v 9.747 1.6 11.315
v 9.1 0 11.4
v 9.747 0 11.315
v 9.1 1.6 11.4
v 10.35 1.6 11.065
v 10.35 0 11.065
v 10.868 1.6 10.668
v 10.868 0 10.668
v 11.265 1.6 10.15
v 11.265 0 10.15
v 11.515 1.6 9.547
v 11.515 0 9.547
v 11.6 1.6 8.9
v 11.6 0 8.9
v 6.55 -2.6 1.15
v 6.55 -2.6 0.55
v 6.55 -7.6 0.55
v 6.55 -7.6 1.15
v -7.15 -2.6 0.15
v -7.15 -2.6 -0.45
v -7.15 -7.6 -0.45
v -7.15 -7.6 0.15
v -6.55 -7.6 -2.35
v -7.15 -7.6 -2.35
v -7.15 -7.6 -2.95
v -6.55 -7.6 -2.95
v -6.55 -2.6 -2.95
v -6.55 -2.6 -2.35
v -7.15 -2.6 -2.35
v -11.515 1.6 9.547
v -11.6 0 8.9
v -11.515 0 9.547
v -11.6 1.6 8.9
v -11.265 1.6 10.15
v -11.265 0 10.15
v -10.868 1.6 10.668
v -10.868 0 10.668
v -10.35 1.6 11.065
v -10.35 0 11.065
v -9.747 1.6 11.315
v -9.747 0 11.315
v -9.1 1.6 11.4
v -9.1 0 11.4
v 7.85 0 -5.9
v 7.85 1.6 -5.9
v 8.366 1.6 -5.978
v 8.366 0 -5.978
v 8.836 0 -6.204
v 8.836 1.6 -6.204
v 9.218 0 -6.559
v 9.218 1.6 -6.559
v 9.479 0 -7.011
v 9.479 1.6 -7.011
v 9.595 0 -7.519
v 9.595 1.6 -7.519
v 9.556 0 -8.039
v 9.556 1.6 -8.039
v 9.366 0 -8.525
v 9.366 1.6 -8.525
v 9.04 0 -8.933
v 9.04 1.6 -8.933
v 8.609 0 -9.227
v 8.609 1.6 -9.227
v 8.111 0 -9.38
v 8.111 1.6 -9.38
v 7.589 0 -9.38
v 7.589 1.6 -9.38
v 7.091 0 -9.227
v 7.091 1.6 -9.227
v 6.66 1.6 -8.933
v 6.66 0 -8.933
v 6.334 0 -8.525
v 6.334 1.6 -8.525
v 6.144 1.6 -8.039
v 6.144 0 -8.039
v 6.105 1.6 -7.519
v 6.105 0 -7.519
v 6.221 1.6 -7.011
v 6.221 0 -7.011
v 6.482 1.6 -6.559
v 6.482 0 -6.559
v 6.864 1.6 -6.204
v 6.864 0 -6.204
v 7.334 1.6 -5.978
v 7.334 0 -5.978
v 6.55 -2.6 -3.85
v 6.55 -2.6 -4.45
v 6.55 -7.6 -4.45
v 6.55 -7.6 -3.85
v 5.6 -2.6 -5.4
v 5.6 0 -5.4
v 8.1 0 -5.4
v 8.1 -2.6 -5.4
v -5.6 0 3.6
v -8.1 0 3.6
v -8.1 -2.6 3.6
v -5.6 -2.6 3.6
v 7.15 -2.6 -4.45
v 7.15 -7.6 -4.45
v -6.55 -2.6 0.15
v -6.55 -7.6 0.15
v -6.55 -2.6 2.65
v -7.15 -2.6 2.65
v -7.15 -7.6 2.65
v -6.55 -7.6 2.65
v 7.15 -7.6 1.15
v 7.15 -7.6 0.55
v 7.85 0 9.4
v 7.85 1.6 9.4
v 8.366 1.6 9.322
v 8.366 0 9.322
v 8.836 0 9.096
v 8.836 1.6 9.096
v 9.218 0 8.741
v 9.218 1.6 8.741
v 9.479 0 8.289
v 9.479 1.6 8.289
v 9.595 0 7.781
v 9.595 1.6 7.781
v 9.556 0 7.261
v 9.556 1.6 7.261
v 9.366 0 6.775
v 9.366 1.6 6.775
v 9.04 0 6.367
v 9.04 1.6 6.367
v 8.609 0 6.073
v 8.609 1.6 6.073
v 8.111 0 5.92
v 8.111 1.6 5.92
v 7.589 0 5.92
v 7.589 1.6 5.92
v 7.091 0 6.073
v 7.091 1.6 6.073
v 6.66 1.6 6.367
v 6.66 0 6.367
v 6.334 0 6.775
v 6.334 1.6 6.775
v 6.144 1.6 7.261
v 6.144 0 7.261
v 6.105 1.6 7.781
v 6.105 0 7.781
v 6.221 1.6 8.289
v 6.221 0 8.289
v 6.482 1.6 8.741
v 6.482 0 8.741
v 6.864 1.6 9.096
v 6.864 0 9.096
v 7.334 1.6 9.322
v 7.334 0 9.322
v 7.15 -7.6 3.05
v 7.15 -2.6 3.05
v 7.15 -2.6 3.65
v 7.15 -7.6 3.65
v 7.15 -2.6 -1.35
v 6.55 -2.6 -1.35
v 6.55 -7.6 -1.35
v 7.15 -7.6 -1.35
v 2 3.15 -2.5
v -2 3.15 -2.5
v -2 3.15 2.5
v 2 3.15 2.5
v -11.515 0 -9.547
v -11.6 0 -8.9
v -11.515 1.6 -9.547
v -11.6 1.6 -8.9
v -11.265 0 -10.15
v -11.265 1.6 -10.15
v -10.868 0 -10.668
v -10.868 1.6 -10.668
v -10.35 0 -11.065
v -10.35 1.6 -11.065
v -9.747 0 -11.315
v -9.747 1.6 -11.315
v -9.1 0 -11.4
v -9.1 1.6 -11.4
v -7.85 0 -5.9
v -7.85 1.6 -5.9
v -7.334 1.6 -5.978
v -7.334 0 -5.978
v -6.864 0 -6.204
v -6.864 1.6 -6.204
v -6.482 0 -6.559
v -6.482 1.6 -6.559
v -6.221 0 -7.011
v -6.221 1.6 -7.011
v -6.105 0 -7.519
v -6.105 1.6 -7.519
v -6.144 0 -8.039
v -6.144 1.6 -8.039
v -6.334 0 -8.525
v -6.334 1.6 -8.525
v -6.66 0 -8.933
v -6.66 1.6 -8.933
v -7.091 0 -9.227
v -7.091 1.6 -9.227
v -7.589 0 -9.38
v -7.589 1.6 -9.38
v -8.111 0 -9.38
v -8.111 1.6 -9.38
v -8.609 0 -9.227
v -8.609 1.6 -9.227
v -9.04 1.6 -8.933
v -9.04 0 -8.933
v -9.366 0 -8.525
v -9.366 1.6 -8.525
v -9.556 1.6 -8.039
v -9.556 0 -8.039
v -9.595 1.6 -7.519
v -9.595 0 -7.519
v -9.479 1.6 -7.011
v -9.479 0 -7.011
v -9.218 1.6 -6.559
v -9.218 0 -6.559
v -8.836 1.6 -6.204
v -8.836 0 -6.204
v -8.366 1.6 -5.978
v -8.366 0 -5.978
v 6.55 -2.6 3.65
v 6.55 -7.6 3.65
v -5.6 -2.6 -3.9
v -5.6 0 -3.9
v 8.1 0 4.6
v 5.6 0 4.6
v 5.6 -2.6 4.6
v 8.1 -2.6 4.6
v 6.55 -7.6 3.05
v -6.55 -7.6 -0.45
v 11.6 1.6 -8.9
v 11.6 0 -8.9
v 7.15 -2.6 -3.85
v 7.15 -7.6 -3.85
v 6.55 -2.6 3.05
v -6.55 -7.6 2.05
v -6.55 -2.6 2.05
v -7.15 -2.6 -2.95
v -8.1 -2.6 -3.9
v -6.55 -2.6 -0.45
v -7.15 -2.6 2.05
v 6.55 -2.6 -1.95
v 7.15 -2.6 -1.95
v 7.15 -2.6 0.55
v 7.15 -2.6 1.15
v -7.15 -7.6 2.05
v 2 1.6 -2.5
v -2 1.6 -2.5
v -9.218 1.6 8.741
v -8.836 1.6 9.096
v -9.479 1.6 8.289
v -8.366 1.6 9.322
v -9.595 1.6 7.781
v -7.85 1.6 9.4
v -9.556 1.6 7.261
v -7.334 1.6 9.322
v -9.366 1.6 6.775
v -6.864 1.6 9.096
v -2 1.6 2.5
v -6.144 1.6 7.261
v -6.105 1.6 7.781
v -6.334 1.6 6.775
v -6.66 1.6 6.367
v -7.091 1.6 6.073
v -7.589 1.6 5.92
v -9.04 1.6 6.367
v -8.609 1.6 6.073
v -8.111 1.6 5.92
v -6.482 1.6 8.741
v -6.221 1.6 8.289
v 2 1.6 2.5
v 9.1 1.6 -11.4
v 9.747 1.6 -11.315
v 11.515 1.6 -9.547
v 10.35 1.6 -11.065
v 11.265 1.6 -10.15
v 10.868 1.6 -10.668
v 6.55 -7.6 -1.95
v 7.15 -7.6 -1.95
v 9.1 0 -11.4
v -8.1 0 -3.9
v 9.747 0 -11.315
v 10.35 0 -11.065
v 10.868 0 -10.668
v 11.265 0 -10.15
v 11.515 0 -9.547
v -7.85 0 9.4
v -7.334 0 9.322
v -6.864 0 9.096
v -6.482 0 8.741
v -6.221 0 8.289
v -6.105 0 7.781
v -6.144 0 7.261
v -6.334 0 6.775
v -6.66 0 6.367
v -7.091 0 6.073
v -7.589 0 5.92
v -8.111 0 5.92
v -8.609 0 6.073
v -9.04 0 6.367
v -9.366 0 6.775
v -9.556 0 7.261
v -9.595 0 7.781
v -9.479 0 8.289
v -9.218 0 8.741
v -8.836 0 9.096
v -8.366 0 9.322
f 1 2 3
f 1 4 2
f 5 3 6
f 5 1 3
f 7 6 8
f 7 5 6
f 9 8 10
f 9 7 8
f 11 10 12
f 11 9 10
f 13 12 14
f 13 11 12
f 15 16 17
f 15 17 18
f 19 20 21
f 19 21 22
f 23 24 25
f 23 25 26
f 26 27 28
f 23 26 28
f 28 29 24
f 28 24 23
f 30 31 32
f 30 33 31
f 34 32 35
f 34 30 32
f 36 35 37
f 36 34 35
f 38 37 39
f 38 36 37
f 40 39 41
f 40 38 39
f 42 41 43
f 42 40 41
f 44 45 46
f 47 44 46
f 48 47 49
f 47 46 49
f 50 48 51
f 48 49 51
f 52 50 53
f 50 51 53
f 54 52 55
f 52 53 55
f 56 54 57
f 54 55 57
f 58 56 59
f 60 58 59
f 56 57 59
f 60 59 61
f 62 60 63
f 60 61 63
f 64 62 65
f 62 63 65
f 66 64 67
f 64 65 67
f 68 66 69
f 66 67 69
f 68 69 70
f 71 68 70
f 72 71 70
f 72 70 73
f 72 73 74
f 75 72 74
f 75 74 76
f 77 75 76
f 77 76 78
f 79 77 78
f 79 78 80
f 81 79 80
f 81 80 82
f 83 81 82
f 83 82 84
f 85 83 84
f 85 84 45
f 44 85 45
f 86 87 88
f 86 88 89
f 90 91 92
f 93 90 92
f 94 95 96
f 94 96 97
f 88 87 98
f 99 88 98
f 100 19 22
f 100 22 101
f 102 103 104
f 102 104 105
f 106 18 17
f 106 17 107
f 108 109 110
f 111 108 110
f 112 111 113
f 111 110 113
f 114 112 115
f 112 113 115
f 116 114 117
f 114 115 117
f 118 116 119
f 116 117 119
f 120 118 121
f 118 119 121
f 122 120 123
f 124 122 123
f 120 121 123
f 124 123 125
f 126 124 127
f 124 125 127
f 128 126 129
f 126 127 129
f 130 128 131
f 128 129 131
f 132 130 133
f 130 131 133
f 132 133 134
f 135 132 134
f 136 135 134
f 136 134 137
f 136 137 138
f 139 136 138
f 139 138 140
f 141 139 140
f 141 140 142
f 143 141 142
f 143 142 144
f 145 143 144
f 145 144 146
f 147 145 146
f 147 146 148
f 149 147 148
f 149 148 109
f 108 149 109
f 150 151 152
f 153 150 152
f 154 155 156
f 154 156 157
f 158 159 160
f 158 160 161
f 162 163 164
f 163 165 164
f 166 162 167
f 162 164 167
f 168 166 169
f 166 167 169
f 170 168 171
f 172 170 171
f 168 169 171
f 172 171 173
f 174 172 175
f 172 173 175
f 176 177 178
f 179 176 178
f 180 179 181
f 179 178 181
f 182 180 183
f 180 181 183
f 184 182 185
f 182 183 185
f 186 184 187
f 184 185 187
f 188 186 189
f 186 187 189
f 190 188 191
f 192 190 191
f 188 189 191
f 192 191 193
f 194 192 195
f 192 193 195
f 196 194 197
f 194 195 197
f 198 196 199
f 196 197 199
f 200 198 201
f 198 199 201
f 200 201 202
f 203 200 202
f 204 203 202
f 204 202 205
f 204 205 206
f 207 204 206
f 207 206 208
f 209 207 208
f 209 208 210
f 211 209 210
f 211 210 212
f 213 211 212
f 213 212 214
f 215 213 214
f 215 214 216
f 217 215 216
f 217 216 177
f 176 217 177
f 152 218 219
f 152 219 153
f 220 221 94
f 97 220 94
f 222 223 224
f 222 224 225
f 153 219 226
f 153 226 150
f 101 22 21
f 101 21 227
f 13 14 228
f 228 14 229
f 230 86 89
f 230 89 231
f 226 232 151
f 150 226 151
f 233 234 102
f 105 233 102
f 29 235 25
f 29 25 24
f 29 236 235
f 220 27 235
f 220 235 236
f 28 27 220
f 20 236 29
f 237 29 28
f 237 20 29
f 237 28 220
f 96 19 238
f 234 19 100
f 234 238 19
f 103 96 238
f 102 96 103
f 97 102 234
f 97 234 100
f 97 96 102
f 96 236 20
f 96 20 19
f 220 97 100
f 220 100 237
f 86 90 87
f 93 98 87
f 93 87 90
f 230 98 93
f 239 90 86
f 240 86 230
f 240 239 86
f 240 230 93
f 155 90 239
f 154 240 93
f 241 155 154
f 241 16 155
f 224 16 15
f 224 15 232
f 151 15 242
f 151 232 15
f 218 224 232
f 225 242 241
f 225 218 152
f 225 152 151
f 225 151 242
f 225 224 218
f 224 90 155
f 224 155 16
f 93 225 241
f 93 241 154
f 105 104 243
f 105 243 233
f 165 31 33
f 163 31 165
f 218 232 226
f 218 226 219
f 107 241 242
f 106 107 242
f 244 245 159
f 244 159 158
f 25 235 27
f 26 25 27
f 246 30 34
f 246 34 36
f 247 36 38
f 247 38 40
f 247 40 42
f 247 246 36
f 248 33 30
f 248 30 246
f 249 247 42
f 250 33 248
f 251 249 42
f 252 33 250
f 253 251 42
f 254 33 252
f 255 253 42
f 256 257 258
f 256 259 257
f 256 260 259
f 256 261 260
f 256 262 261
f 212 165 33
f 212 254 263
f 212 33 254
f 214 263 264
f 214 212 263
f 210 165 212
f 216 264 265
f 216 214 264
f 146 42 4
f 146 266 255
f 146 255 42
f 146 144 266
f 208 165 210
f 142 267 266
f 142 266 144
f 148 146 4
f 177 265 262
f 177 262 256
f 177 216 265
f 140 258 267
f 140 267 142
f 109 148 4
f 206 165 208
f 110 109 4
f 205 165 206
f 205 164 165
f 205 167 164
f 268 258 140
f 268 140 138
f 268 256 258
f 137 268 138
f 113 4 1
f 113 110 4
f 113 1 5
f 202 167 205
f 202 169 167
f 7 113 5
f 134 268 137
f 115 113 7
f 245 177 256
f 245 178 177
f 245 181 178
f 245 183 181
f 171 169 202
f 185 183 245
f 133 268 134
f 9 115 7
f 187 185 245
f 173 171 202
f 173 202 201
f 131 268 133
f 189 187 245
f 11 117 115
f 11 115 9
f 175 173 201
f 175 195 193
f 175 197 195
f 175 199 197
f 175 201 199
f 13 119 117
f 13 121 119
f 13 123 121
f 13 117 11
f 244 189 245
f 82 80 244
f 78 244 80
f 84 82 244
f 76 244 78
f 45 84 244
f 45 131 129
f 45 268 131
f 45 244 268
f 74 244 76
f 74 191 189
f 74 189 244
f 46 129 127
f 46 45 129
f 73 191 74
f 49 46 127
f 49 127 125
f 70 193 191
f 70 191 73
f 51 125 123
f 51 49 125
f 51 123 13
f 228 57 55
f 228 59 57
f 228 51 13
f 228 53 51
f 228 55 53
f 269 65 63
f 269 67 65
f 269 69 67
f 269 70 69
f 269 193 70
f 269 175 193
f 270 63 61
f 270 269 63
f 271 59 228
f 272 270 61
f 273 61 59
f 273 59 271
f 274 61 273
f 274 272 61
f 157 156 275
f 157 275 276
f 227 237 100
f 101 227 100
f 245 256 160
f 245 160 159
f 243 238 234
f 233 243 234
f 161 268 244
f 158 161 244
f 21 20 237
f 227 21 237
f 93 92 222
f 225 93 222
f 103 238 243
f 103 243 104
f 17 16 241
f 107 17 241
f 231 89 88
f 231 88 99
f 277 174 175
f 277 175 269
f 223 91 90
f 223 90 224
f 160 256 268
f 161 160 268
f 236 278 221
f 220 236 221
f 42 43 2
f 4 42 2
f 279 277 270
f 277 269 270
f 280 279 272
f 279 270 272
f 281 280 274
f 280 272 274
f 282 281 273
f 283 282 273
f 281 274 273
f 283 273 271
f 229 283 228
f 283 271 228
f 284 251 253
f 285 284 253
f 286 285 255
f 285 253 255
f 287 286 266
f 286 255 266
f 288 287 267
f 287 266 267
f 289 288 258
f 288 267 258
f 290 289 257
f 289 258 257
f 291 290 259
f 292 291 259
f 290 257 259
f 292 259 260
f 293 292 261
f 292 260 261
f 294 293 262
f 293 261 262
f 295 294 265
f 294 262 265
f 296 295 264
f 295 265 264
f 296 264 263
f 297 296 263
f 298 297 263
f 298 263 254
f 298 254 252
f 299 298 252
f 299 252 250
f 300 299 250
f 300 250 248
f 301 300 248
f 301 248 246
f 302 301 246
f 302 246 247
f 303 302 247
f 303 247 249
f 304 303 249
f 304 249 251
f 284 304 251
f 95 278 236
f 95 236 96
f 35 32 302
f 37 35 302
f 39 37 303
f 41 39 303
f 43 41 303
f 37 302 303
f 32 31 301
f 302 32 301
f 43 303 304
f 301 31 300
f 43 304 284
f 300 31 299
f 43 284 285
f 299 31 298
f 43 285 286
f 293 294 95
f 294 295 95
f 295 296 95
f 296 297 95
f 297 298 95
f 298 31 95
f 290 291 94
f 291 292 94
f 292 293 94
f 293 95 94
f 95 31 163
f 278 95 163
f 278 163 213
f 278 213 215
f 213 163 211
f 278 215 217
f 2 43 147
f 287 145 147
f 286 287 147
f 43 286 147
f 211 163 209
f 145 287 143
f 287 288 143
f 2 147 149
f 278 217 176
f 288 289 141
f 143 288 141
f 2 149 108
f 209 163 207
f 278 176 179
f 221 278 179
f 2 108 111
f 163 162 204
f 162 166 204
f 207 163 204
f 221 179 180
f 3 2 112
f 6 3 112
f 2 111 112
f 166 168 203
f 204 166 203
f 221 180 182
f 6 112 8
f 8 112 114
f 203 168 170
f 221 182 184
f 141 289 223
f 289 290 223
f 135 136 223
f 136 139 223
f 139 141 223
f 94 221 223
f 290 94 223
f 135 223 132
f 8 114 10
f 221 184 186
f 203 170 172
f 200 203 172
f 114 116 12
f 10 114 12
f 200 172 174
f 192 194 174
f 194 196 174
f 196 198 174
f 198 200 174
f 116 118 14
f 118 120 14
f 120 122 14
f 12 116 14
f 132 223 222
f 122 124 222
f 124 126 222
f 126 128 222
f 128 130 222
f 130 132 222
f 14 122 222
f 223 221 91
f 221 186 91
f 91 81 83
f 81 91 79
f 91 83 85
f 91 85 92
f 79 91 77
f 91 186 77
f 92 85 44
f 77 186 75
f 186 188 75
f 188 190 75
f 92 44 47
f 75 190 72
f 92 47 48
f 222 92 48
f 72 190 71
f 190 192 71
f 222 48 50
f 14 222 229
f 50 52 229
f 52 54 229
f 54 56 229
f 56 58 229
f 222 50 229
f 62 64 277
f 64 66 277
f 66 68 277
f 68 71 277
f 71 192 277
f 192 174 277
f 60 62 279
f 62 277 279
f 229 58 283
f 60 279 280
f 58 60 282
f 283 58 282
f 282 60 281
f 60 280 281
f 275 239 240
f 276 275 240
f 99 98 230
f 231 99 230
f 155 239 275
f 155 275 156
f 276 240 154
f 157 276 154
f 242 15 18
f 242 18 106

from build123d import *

# Parameters (mm, degrees)
SKETCH1_W           = 23.2
SKETCH1_H           = 22.8
SKETCH1_W_2         = 4
SKETCH1_H_2         = 5
BOSS_EXTRUDE1_DEPTH = 1.6
SKETCH1_4_W         = 4
SKETCH1_4_H         = 5
BOSS_EXTRUDE2_DEPTH = 3.15
FILLET1_R           = 2.5
SKETCH2_R           = 1.75
CUT_EXTRUDE1_DEPTH  = 3.1
SKETCH3_W           = 2.5
SKETCH3_H           = 10
SKETCH3_H_2         = 7.5
BOSS_EXTRUDE3_DEPTH = 2.6
SKETCH4_W           = 0.6
SKETCH4_H           = 0.6
BOSS_EXTRUDE4_DEPTH = 5


with BuildPart() as part:
    # Sketch1 → Boss-Extrude1 (new body)
    with BuildSketch(Plane(origin=(0, 0, 0), x_dir=(1, 0, 0), z_dir=(0, 1, 0))):
        Rectangle(SKETCH1_W, SKETCH1_H)
        Rectangle(SKETCH1_W_2, SKETCH1_H_2, mode=Mode.SUBTRACT)
    extrude(amount=BOSS_EXTRUDE1_DEPTH)

    # Sketch1<4> → Boss-Extrude2 (add)
    with BuildSketch(Plane(origin=(0, 0, 0), x_dir=(1, 0, 0), z_dir=(0, 1, 0))):
        Rectangle(SKETCH1_4_W, SKETCH1_4_H)
    extrude(amount=BOSS_EXTRUDE2_DEPTH)

    # Fillet1
    fillet1_edges = [part.edges().sort_by_distance(p)[0] for p in [
        (-11.6, 0.8, -11.4),
        (-11.6, 0.8, 11.4),
        (11.6, 0.8, -11.4),
        (11.6, 0.8, 11.4),
    ]]
    fillet(fillet1_edges, radius=FILLET1_R)

    # Sketch2 → Cut-Extrude1 (cut)
    with BuildSketch(Plane(origin=(0, 1.6, 0), x_dir=(1, 0, 0), z_dir=(0, 1, 0))):
        with Locations((-7.85, -7.65)):
            Circle(SKETCH2_R)
        with Locations((-7.85, 7.65)):
            Circle(SKETCH2_R)
        with Locations((7.85, -7.65)):
            Circle(SKETCH2_R)
        with Locations((7.85, 7.65)):
            Circle(SKETCH2_R)
    extrude(amount=-CUT_EXTRUDE1_DEPTH, mode=Mode.SUBTRACT)

    # Sketch3 → Boss-Extrude3 (add)
    with BuildSketch(Plane.XZ):
        with Locations((6.85, -0.4)):
            Rectangle(SKETCH3_W, SKETCH3_H)
        with Locations((-6.85, -0.15)):
            Rectangle(SKETCH3_W, SKETCH3_H_2)
    extrude(amount=BOSS_EXTRUDE3_DEPTH)

    # Sketch4 → Boss-Extrude4 (add)
    with BuildSketch(Plane.XZ.offset(2.6)):
        with Locations((-6.85, -0.15)):
            Rectangle(SKETCH4_W, SKETCH4_H)
        with Locations((-6.85, 2.35)):
            Rectangle(SKETCH4_W, SKETCH4_H)
        with Locations((-6.85, -2.65)):
            Rectangle(SKETCH4_W, SKETCH4_H)
        with Locations((6.85, 3.35)):
            Rectangle(SKETCH4_W, SKETCH4_H)
        with Locations((6.85, 0.85)):
            Rectangle(SKETCH4_W, SKETCH4_H)
        with Locations((6.85, -1.65)):
            Rectangle(SKETCH4_W, SKETCH4_H)
        with Locations((6.85, -4.15)):
            Rectangle(SKETCH4_W, SKETCH4_H)
    extrude(amount=BOSS_EXTRUDE4_DEPTH)


solid = part.part
